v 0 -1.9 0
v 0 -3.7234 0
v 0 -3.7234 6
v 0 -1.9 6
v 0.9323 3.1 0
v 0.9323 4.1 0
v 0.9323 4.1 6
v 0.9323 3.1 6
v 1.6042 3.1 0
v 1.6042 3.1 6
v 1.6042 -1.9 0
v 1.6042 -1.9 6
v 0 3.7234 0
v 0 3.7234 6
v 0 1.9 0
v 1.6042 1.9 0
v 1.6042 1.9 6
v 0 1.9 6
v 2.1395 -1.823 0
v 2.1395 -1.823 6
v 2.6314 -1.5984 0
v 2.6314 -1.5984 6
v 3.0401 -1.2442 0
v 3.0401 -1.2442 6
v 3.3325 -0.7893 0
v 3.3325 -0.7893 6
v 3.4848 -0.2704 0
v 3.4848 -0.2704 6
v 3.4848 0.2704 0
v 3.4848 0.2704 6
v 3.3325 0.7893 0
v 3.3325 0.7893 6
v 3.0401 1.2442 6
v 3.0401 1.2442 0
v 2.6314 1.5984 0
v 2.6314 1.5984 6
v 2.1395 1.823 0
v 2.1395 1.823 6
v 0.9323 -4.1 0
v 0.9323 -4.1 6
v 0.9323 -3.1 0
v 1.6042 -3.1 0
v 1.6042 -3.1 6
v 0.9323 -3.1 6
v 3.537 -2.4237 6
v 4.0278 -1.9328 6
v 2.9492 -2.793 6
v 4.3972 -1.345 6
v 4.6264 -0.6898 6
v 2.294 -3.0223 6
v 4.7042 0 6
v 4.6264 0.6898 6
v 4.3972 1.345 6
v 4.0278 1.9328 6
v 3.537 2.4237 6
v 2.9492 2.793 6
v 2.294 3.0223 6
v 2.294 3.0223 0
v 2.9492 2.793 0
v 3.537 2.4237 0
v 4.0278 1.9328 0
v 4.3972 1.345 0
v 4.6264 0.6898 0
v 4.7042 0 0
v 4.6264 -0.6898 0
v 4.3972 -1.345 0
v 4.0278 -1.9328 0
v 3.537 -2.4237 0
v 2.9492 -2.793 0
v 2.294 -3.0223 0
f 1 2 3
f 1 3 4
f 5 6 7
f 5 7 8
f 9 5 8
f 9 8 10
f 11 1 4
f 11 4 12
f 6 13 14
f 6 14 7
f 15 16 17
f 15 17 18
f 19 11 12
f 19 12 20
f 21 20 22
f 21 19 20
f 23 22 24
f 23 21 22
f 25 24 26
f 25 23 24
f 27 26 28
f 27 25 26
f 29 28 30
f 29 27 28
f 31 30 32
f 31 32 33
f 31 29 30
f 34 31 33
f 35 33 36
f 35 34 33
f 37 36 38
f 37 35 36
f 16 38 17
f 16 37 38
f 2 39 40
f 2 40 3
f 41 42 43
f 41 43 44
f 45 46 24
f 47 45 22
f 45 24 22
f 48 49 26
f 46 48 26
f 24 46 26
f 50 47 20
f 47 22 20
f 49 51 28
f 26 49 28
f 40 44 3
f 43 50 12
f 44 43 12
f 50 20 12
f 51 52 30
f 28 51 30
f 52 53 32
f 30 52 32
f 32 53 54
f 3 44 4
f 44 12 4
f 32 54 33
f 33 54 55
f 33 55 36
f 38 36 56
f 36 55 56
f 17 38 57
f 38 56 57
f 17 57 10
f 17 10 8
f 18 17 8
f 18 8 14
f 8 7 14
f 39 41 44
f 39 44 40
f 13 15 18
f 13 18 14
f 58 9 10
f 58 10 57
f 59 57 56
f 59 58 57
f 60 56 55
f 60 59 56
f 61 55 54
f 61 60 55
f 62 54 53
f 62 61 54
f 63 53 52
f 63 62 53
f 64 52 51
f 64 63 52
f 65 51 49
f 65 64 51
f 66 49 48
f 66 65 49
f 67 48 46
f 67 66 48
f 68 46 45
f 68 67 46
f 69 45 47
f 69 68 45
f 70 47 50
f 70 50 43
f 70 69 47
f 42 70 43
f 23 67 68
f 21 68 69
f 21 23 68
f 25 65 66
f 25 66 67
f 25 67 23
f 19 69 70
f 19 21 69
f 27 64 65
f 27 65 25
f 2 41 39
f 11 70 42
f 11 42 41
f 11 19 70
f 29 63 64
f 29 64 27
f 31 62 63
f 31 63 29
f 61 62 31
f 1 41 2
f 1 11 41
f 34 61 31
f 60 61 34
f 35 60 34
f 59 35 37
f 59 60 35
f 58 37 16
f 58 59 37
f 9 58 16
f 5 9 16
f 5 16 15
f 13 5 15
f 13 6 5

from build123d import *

# Parameters (mm, degrees)
AUFSATZ_LINEAR_AUSTRAGEN1_DEPTH = 6


with BuildPart() as part:
    # Skizze1 → Aufsatz-Linear austragen1 (new body)
    with BuildSketch(Plane.XY):
        with BuildLine():
            Line((0.932336104, 3.1), (1.604162004, 3.1))
            ThreePointArc((1.604162004, 3.1), (4.704162004, 0), (1.604162004, -3.1))
            Line((1.604162004, -3.1), (0.932336104, -3.1))
            Line((0.932336104, -3.1), (0.932336104, -4.1))
            Line((0.932336104, -4.1), (0, -3.723445161))
            Line((0, -3.723445161), (0, -3.356483855))
            Line((0, -3.356483855), (0, -1.9))
            Line((0, -1.9), (1.604162004, -1.9))
            ThreePointArc((1.604162004, -1.9), (3.504162004, 0), (1.604162004, 1.9))
            Line((1.604162004, 1.9), (0, 1.9))
            Line((0, 1.9), (0, 3.356483855))
            Line((0, 3.356483855), (0, 3.723445161))
            Line((0, 3.723445161), (0.932336104, 4.1))
            Line((0.932336104, 4.1), (0.932336104, 3.1))
        make_face()
    extrude(amount=AUFSATZ_LINEAR_AUSTRAGEN1_DEPTH)


solid = part.part
